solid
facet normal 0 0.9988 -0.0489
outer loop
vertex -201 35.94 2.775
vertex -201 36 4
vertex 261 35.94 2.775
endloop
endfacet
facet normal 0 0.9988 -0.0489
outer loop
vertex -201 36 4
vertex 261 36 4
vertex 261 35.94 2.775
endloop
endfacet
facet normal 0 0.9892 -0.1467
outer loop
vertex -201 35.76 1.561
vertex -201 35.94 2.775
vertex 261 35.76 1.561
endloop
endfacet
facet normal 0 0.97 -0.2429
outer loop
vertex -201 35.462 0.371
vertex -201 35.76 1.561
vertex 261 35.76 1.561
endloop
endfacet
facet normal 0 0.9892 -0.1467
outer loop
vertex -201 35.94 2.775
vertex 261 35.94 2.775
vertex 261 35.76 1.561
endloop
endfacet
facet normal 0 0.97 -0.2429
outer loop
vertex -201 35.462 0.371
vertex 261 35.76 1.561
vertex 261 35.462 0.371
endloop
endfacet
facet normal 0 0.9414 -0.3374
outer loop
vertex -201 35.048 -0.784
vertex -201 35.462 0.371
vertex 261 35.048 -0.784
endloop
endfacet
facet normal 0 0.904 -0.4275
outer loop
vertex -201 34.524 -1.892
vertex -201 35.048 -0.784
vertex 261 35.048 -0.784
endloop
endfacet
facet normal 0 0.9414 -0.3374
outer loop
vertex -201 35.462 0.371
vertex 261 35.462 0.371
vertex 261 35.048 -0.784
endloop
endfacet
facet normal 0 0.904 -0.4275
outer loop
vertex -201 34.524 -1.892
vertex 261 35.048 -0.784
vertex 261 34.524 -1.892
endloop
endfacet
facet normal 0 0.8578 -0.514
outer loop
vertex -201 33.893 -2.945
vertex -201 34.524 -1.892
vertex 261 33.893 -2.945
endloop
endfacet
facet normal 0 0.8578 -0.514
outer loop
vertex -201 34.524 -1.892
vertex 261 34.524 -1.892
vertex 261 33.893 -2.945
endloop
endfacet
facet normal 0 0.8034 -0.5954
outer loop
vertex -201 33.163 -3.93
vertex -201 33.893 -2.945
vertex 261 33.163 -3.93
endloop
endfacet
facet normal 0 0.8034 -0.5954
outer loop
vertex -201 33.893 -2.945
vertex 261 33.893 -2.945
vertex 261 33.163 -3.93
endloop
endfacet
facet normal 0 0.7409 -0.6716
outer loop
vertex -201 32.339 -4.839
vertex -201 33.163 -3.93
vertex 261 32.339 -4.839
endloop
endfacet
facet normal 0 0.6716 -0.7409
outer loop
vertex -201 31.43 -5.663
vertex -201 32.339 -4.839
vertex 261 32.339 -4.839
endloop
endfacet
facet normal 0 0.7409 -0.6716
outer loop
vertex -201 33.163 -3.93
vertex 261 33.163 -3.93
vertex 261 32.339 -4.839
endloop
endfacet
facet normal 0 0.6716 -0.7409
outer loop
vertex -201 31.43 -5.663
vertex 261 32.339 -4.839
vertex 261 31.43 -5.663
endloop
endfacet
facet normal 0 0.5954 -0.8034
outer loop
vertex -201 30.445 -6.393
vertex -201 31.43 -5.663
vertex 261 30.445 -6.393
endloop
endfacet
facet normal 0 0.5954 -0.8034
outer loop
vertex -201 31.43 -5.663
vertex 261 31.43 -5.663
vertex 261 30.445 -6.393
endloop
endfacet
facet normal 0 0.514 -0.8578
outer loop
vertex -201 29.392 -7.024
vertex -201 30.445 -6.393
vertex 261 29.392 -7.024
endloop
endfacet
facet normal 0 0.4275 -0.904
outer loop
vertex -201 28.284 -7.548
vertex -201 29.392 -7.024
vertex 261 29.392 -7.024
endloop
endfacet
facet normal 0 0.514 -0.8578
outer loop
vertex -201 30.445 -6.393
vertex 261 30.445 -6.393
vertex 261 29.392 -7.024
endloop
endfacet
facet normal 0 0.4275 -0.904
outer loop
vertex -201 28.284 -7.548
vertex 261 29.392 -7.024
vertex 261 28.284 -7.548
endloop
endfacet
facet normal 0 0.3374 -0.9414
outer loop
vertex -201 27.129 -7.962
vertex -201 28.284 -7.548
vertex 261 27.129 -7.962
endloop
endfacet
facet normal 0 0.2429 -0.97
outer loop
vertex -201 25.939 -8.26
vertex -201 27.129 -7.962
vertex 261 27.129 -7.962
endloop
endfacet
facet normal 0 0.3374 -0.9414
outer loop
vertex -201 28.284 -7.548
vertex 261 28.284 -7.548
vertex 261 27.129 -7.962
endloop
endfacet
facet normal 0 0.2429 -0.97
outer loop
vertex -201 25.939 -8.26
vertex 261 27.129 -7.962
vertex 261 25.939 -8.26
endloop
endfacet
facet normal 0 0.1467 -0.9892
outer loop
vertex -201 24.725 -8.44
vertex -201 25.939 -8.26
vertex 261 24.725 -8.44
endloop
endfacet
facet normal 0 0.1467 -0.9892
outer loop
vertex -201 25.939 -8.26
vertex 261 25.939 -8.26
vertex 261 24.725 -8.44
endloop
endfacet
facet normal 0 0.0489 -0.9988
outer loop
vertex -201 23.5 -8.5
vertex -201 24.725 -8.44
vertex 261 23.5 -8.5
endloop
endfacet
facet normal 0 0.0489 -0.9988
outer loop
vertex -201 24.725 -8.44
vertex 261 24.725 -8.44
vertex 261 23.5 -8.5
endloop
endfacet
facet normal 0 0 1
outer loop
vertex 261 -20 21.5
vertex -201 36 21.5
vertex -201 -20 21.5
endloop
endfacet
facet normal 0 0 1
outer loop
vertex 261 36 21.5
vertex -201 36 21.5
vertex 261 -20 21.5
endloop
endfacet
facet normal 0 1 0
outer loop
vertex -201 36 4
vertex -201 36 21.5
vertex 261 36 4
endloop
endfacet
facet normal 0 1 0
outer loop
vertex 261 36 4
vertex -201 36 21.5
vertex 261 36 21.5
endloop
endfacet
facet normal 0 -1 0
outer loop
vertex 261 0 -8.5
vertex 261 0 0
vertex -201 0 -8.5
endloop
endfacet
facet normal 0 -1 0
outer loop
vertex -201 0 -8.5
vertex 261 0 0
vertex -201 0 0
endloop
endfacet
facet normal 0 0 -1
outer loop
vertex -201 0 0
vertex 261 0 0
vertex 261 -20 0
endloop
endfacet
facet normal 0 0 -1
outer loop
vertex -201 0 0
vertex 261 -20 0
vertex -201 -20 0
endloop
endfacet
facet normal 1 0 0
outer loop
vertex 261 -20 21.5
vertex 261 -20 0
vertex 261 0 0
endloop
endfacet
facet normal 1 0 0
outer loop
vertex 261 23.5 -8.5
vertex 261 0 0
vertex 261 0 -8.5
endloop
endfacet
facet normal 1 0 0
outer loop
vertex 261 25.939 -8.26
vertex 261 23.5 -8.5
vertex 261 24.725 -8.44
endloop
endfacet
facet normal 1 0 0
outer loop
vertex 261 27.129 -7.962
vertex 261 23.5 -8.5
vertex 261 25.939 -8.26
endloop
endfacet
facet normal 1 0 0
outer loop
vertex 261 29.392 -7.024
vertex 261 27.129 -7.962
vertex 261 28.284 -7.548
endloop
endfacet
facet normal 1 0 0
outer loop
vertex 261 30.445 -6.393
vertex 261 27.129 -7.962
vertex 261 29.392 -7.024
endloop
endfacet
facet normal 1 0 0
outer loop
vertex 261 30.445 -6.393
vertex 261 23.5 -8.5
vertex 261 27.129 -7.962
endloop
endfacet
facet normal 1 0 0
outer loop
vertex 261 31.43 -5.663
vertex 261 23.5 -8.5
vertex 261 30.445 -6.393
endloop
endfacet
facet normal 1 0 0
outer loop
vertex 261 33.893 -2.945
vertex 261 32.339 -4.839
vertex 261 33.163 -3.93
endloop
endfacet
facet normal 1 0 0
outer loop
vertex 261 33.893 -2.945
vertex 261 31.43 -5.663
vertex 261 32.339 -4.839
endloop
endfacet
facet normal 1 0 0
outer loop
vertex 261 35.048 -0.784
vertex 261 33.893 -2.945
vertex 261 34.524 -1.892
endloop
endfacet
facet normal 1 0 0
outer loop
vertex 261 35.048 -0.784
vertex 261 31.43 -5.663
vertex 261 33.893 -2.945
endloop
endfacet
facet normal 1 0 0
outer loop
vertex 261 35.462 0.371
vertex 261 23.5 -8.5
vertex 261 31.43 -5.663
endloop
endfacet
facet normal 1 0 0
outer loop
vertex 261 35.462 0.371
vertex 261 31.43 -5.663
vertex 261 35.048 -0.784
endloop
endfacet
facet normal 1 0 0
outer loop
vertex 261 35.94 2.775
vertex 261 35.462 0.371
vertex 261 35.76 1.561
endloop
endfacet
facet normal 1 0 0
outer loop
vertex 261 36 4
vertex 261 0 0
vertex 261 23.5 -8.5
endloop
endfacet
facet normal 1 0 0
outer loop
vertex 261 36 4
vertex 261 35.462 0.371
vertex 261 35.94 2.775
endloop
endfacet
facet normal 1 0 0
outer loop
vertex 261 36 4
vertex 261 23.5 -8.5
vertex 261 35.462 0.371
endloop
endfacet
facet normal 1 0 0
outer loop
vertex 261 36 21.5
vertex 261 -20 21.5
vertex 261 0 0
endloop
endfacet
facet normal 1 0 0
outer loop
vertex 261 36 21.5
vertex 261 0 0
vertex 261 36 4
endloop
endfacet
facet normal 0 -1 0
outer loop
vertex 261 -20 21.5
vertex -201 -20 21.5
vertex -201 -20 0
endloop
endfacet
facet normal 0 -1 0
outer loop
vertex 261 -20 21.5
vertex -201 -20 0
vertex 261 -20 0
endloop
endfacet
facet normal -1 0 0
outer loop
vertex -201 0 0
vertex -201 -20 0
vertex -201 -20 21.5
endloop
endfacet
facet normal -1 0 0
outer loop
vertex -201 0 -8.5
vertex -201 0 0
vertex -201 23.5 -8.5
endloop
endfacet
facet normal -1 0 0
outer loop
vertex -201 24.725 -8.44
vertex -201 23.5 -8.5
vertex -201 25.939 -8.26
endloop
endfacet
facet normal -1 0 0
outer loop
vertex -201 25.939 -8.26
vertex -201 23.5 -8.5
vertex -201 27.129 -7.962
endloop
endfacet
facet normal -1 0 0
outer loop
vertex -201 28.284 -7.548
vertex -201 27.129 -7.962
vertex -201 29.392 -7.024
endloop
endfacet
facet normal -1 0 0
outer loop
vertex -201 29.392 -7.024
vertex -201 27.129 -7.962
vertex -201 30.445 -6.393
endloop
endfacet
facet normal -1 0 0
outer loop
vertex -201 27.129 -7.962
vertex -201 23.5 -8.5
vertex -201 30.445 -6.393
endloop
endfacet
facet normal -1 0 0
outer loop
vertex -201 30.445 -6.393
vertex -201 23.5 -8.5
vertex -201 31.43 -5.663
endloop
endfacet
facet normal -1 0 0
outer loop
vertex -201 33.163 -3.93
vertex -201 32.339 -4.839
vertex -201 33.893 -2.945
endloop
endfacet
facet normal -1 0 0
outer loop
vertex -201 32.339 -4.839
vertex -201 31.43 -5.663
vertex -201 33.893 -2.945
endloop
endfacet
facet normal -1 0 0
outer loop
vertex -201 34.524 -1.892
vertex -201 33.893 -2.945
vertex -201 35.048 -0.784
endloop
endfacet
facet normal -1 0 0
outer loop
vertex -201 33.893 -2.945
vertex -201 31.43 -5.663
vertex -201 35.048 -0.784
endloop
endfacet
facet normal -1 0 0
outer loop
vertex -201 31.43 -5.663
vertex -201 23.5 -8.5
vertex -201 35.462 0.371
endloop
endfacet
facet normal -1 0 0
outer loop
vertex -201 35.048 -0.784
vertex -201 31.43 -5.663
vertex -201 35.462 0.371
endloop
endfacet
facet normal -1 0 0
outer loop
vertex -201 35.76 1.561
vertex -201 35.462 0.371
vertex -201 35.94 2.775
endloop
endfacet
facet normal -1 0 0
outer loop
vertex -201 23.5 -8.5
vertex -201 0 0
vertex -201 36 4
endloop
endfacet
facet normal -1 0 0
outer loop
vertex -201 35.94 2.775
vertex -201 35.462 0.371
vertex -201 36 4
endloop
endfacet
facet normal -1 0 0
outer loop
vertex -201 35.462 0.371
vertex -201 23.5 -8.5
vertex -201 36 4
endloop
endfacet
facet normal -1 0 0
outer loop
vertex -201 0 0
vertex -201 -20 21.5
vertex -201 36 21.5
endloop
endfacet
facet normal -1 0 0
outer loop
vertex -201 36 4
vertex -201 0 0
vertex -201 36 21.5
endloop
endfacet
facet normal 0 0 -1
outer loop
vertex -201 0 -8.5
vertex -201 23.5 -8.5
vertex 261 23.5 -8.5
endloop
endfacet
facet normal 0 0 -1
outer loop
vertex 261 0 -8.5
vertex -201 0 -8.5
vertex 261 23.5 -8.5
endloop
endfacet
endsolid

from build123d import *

# Parameters (mm, degrees)
ESQUISSE1_W             = 462
ESQUISSE1_H             = 56
BOSS_EXTRU_1_DEPTH      = 21.5
BOSS_EXTRU_1_DEPTH_BACK = 8.5
ENL_V_START             = -8.5
ESQUISSE2_W             = 462
ESQUISSE2_H             = 20
ENL_V_MAT_EXTRU_2_DEPTH = 8.5
CONG_1_R                = 12.5


with BuildPart() as part:
    # Esquisse1 → Boss.-Extru.1 (new body, two sides)
    with BuildSketch(Plane.XY) as boss_extru_1_sk:
        with Locations((30, 8)):
            Rectangle(ESQUISSE1_W, ESQUISSE1_H)
    extrude(amount=BOSS_EXTRU_1_DEPTH)
    extrude(boss_extru_1_sk.sketch, amount=-BOSS_EXTRU_1_DEPTH_BACK)

    # Esquisse2 → Enl_v. mat.-Extru.2 (cut)
    with BuildSketch(Plane(origin=(0, 0, -8.5), x_dir=(-1, 0, 0), z_dir=(0, 0, -1)).offset(ENL_V_START)):
        with Locations((-30, -10)):
            Rectangle(ESQUISSE2_W, ESQUISSE2_H)
    extrude(amount=ENL_V_MAT_EXTRU_2_DEPTH, mode=Mode.SUBTRACT)

    # Cong_1
    cong_1_edges = [part.edges().sort_by_distance(p)[0] for p in [
        (30, 36, -8.5),
    ]]
    fillet(cong_1_edges, radius=CONG_1_R)


solid = part.part
